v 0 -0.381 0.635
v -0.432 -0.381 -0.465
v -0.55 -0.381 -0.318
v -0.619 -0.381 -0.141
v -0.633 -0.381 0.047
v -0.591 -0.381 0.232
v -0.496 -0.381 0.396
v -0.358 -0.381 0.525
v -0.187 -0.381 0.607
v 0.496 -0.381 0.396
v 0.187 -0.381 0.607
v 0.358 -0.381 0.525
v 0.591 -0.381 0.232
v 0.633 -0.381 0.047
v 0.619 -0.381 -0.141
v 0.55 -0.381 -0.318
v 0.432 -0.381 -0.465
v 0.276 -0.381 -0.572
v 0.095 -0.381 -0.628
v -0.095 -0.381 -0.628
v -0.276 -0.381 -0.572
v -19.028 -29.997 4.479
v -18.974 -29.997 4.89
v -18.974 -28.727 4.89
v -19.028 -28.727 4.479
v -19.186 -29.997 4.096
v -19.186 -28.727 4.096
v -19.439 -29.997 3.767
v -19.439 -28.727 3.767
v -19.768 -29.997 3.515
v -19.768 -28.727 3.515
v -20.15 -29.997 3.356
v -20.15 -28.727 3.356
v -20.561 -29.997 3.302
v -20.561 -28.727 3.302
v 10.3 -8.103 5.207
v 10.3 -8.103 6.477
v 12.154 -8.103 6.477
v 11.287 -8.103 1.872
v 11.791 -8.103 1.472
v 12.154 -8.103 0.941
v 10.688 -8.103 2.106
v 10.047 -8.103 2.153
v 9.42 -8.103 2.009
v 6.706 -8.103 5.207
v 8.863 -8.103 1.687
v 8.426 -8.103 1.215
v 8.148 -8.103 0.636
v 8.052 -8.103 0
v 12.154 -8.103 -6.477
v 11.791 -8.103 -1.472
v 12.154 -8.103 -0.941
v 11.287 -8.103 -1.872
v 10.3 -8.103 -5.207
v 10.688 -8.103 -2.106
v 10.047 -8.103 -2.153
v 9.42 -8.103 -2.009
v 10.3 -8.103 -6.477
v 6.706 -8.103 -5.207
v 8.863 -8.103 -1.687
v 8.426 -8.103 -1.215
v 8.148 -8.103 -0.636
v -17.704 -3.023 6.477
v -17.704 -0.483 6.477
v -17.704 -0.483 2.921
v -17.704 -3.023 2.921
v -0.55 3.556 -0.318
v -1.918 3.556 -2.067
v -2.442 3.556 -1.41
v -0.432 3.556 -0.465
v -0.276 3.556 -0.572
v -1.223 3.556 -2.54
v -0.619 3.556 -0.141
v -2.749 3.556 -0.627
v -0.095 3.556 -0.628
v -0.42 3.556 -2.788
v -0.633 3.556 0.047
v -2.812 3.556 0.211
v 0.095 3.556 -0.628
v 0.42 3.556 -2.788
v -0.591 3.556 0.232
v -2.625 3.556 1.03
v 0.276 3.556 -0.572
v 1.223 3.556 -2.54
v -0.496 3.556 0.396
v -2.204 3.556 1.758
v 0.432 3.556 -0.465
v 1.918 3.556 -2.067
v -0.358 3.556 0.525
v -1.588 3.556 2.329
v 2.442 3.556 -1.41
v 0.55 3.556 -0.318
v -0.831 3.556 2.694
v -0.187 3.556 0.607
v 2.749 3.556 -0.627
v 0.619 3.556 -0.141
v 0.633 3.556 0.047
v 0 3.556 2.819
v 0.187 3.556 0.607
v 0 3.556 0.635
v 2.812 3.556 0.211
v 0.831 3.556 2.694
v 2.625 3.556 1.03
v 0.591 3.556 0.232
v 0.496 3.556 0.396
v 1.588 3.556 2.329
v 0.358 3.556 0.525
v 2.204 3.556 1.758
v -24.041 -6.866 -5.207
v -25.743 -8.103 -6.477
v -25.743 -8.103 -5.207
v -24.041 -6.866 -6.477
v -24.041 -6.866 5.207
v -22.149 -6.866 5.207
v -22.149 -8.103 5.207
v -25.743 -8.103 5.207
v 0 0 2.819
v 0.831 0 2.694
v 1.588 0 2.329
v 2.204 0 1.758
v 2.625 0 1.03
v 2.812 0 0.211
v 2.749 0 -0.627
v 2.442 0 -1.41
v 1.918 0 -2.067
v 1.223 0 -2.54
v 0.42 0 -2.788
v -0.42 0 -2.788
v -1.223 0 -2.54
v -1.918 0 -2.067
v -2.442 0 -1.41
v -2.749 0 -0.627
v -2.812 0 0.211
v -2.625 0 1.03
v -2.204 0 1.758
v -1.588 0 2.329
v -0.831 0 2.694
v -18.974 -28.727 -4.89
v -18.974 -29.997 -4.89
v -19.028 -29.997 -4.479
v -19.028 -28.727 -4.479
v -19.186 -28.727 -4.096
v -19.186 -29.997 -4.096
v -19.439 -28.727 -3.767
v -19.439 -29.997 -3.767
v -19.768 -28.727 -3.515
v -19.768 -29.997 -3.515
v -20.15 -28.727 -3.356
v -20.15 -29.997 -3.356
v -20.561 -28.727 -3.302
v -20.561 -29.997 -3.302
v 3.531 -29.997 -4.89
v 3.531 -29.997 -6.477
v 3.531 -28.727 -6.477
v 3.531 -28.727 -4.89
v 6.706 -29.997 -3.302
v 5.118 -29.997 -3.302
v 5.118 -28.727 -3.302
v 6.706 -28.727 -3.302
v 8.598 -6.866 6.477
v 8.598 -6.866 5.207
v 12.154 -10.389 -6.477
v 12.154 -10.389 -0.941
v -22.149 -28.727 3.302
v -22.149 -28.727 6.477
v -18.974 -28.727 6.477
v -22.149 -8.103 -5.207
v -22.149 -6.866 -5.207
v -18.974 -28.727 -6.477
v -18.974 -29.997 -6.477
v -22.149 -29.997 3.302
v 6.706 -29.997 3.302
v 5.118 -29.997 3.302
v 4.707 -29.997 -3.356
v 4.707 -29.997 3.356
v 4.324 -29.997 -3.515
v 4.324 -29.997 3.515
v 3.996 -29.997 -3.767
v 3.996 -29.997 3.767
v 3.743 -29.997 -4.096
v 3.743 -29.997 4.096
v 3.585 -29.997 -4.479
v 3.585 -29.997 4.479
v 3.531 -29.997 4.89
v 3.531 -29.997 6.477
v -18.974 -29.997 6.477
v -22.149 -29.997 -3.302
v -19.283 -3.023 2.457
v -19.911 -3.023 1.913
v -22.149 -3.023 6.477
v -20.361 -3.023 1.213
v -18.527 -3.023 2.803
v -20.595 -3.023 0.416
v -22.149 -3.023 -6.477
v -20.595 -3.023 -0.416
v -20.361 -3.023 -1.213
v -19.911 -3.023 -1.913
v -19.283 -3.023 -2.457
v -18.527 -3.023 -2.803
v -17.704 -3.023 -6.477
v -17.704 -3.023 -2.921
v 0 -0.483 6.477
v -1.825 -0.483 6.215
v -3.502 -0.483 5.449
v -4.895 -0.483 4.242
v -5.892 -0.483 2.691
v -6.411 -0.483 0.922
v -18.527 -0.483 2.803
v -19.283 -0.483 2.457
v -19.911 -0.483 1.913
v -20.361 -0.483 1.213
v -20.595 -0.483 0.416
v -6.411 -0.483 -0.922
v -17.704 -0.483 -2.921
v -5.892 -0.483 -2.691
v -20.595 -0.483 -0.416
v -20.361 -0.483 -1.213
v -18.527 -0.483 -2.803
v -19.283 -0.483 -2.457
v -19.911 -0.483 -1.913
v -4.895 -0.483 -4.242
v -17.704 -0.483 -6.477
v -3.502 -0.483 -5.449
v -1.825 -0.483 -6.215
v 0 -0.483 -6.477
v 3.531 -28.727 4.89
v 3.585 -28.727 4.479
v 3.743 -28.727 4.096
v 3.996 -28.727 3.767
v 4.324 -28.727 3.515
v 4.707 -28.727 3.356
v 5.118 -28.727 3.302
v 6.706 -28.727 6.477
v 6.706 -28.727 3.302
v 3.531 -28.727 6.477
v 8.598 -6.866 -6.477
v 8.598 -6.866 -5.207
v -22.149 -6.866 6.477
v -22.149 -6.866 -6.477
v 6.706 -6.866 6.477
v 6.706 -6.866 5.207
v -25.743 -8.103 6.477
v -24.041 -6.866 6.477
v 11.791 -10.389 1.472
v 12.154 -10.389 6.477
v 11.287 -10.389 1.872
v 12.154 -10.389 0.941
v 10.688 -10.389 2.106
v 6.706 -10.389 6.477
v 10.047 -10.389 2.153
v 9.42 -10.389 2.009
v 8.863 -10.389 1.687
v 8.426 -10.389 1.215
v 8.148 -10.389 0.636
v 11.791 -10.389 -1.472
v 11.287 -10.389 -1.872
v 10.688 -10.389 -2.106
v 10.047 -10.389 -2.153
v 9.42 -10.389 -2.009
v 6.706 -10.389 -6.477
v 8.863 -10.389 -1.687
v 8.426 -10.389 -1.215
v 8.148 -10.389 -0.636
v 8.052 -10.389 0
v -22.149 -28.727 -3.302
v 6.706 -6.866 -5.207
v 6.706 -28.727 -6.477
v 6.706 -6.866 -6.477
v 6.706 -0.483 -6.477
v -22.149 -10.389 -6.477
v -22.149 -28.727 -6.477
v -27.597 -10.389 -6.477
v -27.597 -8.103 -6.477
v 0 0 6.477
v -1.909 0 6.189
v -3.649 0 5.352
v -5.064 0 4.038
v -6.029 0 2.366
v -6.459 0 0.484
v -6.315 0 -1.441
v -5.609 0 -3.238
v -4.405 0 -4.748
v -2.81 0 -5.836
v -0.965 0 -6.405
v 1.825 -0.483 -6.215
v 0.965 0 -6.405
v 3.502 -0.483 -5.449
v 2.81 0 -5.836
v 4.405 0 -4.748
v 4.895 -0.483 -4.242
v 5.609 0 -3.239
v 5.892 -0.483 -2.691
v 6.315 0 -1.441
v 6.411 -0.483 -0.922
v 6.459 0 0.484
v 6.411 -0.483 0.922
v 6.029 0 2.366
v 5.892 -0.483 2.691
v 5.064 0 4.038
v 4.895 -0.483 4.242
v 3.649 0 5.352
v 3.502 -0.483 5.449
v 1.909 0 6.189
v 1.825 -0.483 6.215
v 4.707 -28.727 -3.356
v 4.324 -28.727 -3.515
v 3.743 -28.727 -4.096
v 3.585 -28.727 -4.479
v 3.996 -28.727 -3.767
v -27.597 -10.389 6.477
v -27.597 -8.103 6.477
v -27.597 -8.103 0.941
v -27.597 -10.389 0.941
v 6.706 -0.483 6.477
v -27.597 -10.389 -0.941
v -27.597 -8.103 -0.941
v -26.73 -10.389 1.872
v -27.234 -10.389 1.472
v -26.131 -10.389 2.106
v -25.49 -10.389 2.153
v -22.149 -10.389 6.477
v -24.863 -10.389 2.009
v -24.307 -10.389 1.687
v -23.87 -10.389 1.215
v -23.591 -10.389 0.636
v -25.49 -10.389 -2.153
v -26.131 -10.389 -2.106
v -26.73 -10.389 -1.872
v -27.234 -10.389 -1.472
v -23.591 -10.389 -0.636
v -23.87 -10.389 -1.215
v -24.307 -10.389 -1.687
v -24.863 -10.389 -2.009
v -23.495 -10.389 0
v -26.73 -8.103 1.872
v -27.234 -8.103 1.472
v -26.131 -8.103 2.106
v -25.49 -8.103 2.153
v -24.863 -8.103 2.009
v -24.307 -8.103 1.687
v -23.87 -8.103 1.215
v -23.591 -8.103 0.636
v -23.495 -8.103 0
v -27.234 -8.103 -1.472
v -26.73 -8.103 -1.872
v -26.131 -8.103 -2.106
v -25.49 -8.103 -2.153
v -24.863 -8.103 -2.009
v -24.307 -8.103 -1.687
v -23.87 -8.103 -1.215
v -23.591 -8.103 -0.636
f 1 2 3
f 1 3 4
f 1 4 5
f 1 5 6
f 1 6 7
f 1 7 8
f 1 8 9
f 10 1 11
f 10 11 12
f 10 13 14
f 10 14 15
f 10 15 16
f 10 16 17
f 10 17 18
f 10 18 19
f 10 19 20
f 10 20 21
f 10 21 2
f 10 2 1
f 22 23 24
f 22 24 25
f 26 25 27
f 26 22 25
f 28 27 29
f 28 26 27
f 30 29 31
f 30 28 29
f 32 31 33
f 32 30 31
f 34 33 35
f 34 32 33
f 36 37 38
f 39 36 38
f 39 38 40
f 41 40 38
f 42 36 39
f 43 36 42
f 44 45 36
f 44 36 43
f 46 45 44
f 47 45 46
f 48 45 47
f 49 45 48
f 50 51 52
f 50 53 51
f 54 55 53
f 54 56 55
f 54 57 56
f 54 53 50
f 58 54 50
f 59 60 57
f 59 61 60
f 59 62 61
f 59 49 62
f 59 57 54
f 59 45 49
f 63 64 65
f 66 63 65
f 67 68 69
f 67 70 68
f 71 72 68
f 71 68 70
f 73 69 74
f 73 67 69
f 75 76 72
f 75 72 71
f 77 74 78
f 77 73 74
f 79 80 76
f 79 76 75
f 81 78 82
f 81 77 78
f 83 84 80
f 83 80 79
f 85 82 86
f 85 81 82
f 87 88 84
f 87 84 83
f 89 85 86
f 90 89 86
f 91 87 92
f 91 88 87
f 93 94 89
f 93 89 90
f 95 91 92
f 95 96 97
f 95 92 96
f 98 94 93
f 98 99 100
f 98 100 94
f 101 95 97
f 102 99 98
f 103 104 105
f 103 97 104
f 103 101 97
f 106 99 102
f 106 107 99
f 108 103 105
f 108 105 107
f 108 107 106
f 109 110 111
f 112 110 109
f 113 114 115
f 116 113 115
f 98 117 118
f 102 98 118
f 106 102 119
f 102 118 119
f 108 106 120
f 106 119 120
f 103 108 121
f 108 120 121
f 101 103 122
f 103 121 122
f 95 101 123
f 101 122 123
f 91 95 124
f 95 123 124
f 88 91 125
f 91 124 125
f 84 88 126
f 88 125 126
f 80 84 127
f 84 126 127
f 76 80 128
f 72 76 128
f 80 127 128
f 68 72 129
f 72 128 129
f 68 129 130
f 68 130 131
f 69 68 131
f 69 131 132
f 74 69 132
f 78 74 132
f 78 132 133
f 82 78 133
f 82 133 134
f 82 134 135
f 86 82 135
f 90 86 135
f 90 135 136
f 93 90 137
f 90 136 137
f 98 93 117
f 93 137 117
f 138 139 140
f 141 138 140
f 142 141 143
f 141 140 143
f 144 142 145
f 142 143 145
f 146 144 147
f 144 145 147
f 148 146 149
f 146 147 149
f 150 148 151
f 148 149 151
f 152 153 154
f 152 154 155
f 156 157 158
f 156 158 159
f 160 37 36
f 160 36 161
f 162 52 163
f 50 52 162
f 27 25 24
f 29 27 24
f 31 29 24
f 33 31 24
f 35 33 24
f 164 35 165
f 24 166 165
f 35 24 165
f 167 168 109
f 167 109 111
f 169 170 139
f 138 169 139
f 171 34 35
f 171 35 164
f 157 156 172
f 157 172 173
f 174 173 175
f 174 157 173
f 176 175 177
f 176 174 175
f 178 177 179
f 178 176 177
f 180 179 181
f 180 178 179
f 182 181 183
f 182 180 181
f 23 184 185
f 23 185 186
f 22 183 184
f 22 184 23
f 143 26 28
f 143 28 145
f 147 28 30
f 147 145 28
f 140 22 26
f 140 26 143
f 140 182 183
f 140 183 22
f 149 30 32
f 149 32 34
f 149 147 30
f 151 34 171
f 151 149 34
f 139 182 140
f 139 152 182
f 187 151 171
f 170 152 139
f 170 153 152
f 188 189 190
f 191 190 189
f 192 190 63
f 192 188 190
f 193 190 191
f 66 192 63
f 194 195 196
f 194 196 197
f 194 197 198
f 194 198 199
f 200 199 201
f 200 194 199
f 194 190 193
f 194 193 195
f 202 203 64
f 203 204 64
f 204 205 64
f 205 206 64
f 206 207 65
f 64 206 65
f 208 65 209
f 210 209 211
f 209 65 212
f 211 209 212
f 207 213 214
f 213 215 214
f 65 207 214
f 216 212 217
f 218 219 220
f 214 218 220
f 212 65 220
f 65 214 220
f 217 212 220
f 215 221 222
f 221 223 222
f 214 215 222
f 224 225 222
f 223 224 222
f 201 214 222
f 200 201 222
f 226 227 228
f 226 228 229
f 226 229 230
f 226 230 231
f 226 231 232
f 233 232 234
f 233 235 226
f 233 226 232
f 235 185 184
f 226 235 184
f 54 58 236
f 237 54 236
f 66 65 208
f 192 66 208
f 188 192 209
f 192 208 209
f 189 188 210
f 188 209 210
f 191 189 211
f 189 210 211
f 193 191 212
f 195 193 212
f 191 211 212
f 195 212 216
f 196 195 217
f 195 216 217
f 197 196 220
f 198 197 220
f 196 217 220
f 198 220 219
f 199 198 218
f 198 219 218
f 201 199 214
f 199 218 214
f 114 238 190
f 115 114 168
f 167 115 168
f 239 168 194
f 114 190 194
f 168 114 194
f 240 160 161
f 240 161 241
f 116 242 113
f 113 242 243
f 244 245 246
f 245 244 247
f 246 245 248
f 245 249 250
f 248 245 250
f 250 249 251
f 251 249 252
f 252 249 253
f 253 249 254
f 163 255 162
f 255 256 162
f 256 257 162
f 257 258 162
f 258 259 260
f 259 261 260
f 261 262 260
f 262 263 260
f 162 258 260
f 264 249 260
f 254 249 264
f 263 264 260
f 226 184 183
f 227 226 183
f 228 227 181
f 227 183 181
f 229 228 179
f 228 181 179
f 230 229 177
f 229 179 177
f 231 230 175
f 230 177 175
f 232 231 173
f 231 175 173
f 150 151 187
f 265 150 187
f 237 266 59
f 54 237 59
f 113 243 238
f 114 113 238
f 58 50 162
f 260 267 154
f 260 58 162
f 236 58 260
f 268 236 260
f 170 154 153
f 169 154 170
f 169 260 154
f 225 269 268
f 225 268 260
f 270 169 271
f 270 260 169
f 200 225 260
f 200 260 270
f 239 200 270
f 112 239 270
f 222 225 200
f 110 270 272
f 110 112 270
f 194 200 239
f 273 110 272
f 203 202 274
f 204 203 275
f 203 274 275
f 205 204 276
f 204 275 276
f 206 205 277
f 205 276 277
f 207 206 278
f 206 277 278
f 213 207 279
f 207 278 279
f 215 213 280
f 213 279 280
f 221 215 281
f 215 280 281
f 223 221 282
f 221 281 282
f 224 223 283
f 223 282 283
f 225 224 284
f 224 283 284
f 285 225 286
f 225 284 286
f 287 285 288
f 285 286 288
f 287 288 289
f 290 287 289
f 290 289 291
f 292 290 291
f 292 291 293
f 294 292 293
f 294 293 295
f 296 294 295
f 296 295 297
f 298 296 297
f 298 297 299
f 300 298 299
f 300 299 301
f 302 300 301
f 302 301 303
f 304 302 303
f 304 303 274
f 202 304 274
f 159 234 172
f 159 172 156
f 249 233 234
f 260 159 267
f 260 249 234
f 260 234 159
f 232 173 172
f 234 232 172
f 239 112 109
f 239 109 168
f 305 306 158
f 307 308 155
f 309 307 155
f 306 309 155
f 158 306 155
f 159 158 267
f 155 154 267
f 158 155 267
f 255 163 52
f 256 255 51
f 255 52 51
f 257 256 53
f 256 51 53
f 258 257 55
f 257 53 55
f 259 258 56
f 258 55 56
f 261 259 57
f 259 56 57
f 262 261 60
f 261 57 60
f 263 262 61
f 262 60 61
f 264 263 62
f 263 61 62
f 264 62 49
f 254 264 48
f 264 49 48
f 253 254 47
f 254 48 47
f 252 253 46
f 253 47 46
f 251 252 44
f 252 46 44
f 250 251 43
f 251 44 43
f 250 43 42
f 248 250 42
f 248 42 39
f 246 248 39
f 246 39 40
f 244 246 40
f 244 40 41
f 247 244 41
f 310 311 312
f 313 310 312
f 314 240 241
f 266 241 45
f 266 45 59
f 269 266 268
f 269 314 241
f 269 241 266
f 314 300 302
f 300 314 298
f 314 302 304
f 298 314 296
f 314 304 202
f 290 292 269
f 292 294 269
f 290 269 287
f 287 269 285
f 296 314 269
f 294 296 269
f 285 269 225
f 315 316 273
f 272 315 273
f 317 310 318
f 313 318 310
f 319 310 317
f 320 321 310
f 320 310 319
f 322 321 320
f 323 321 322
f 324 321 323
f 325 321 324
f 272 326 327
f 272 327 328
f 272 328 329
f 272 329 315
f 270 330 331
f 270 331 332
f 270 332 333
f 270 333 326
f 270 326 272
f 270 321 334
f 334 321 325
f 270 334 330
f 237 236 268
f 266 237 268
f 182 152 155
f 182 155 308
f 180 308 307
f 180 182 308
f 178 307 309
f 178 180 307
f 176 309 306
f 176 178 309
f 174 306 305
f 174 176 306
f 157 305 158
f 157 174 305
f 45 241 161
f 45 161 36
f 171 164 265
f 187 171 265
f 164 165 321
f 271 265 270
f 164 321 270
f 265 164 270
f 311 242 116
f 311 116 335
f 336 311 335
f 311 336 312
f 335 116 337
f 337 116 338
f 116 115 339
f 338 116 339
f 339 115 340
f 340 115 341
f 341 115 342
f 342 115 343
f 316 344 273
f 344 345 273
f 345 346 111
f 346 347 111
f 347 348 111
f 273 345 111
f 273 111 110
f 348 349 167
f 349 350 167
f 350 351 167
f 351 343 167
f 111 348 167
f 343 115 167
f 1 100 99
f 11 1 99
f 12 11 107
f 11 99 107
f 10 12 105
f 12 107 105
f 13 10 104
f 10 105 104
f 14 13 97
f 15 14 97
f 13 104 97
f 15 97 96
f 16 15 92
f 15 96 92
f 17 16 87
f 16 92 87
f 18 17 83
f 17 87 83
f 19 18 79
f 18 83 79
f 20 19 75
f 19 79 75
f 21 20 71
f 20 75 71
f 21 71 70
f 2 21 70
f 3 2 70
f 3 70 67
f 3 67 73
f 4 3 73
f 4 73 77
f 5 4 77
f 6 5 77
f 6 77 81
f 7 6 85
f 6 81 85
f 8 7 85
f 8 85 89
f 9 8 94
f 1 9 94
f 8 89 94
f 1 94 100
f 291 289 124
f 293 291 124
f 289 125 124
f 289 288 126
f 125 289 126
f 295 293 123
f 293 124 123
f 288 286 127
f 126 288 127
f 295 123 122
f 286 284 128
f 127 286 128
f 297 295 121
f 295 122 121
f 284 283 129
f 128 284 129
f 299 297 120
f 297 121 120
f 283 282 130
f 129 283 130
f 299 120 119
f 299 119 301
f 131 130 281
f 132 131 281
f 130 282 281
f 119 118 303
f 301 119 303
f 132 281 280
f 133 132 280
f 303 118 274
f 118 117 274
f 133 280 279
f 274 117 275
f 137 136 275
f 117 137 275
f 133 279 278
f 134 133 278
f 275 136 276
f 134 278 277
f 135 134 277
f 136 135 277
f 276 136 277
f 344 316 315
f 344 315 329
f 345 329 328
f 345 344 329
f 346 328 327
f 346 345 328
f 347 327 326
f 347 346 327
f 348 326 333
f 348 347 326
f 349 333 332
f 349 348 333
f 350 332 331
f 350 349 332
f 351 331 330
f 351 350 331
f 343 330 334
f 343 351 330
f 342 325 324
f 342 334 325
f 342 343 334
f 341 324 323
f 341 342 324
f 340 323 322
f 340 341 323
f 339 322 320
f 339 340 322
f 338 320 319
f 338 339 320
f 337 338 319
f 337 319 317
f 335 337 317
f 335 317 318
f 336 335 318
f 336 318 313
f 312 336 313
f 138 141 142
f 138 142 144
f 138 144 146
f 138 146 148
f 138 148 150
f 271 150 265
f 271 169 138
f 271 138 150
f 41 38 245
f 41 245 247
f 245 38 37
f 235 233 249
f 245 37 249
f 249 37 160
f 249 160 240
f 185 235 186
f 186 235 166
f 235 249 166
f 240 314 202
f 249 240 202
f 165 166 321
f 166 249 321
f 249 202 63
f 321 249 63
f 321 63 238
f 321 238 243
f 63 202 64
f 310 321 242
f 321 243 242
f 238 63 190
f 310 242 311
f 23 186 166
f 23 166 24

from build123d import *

# Parameters (mm, degrees)
SKETCH1_R               = 2.8194
BOSS_EXTRUDE1_DEPTH     = 3.556
SKETCH2_R               = 6.477
BOSS_EXTRUDE2_DEPTH     = 0.4826
SKETCH3_W               = 28.8544
SKETCH3_H               = 12.954
BOSS_EXTRUDE3_DEPTH     = 29.5148
SKETCH4_R               = 0.635
CUT_EXTRUDE1_DEPTH      = 3.937
SKETCH5_W               = 12.954
SKETCH5_H               = 2.286
BOSS_EXTRUDE4_DEPTH     = 5.4483
BOSS_EXTRUDE5_DEPTH     = 1.27
SKETCH7_R               = 2.159
CUT_EXTRUDE2_DEPTH      = 32.810424981
MIRROR3_COPY_1_DEPTH    = 1.27
CUT_EXTRUDE3_DEPTH      = 2.54
SKETCH10_R              = 1.5875
CUT_EXTRUDE4_DEPTH      = 1.27
MIRROR5_COPY_1_SKETCH_R = 1.5875
MIRROR5_COPY_1_DEPTH    = 1.27


with BuildPart() as part:
    # Sketch1 → Boss-Extrude1 (new body)
    with BuildSketch(Plane(origin=(0, 0, 0), x_dir=(1, 0, 0), z_dir=(0, 1, 0))):
        with Locations(Location((0, 0, 0), (0, 0, 270))):
            Circle(SKETCH1_R)
    extrude(amount=BOSS_EXTRUDE1_DEPTH)

    # Sketch2 → Boss-Extrude2 (add)
    with BuildSketch(Plane(origin=(0, 0, 0), x_dir=(-1, 0, 0), z_dir=(0, -1, 0))):
        with Locations(Location((0, 0, 0), (0, 0, 270))):
            Circle(SKETCH2_R)
    extrude(amount=BOSS_EXTRUDE2_DEPTH)

    # Sketch3 → Boss-Extrude3 (add)
    with BuildSketch(Plane(origin=(0, -0.4826, 0), x_dir=(-1, 0, 0), z_dir=(0, -1, 0))):
        with Locations((7.7216, 0)):
            Rectangle(SKETCH3_W, SKETCH3_H)
    extrude(amount=BOSS_EXTRUDE3_DEPTH)

    # Sketch4 → Cut-Extrude1 (cut)
    with BuildSketch(Plane(origin=(0, 3.556, 0), x_dir=(1, 0, 0), z_dir=(0, 1, 0))):
        with Locations(Location((0, 0, 0), (0, 0, 270))):
            Circle(SKETCH4_R)
    extrude(amount=-CUT_EXTRUDE1_DEPTH, mode=Mode.SUBTRACT)

    # Sketch5 → Boss-Extrude4 (add)
    with BuildSketch(Plane(origin=(6.7056, 0, 0), x_dir=(0, 0, -1), z_dir=(1, 0, 0))):
        with Locations((0, -9.2456)):
            Rectangle(SKETCH5_W, SKETCH5_H)
    boss_extrude4 = extrude(amount=BOSS_EXTRUDE4_DEPTH)

    # Sketch6 → Boss-Extrude5 (add)
    with BuildSketch(Plane.XY.offset(6.477)):
        Polygon((6.7056, -8.1026), (10.2997, -8.1026), (8.5979, -6.866466582), (6.7056, -6.866466582), align=None)
    boss_extrude5 = extrude(amount=-BOSS_EXTRUDE5_DEPTH)

    # Mirror1: Boss-Extrude5 across plane
    add(boss_extrude5.mirror(Plane.XY))

    # Sketch7 → Cut-Extrude2 (cut, through all)
    with BuildSketch(Plane(origin=(0, -8.1026, 0), x_dir=(1, 0, 0), z_dir=(0, 1, 0))):
        with Locations((10.2108, 0)):
            Circle(SKETCH7_R)
    cut_extrude2 = extrude(amount=-CUT_EXTRUDE2_DEPTH, mode=Mode.SUBTRACT)

    # Mirror3: Boss-Extrude4, Boss-Extrude5, Cut-Extrude2 across plane
    add(boss_extrude4.mirror(Plane(origin=(-7.7216, 0, 0), x_dir=(0, 0, 1), z_dir=(1, 0, 0))))
    add(boss_extrude5.mirror(Plane(origin=(-7.7216, 0, 0), x_dir=(0, 0, 1), z_dir=(1, 0, 0))))
    add(cut_extrude2.mirror(Plane(origin=(-7.7216, 0, 0), x_dir=(0, 0, 1), z_dir=(1, 0, 0))), mode=Mode.SUBTRACT)

    # Mirror3 copy 1 sketch → Mirror3 copy 1 (add)
    with BuildSketch(Plane(origin=(-15.4432, 0, -6.477), x_dir=(-1, 0, 0), z_dir=(0, 0, -1))):
        Polygon((6.7056, -8.1026), (10.2997, -8.1026), (8.5979, -6.866466582), (6.7056, -6.866466582), align=None)
    extrude(amount=-MIRROR3_COPY_1_DEPTH)

    # Sketch9 → Cut-Extrude3 (cut)
    with BuildSketch(Plane(origin=(0, -0.4826, 0), x_dir=(1, 0, 0), z_dir=(0, 1, 0))):
        with BuildLine():
            Line((-22.1488, 6.477), (-22.1488, -6.477))
            Line((-22.1488, -6.477), (-17.7038, -6.477))
            Line((-17.7038, -6.477), (-17.7038, -2.921))
            ThreePointArc((-17.7038, -2.921), (-20.6248, 0), (-17.7038, 2.921))
            Line((-17.7038, 2.921), (-17.7038, 6.477))
            Line((-17.7038, 6.477), (-22.1488, 6.477))
        make_face()
    extrude(amount=-CUT_EXTRUDE3_DEPTH, mode=Mode.SUBTRACT)

    # Sketch10 → Cut-Extrude4 (cut)
    with BuildSketch(Plane(origin=(0, -29.9974, 0), x_dir=(-1, 0, 0), z_dir=(0, -1, 0))):
        with Locations((20.5613, 4.8895)):
            Circle(SKETCH10_R)
        with BuildLine():
            Line((22.1488, 6.477), (20.5613, 6.477))
            ThreePointArc((20.5613, 6.477), (21.683832015, 6.012032015), (22.1488, 4.8895))
            Line((22.1488, 4.8895), (22.1488, 6.477))
        make_face()
        with BuildLine():
            ThreePointArc((18.9738, 4.8895), (19.438767985, 6.012032015), (20.5613, 6.477))
            Line((20.5613, 6.477), (18.9738, 6.477))
            Line((18.9738, 6.477), (18.9738, 4.8895))
        make_face()
        with BuildLine():
            Line((22.1488, 3.302), (22.1488, 4.8895))
            ThreePointArc((22.1488, 4.8895), (21.683832015, 3.766967985), (20.5613, 3.302))
            Line((20.5613, 3.302), (22.1488, 3.302))
        make_face()
    cut_extrude4 = extrude(amount=-CUT_EXTRUDE4_DEPTH, mode=Mode.SUBTRACT)

    # Mirror4: Cut-Extrude4 across plane
    add(cut_extrude4.mirror(Plane.XY), mode=Mode.SUBTRACT)

    # Mirror5: Cut-Extrude4 across plane
    add(cut_extrude4.mirror(Plane(origin=(-7.7216, 0, 0), x_dir=(0, 0, 1), z_dir=(1, 0, 0))), mode=Mode.SUBTRACT)

    # Mirror5 copy 1 sketch → Mirror5 copy 1 (cut)
    with BuildSketch(Plane(origin=(-15.4432, -29.9974, 0), x_dir=(1, 0, 0), z_dir=(0, -1, 0))):
        with Locations((20.5613, 4.8895)):
            Circle(MIRROR5_COPY_1_SKETCH_R)
        with BuildLine():
            Line((22.1488, 6.477), (20.5613, 6.477))
            ThreePointArc((20.5613, 6.477), (21.683832015, 6.012032015), (22.1488, 4.8895))
            Line((22.1488, 4.8895), (22.1488, 6.477))
        make_face()
        with BuildLine():
            ThreePointArc((18.9738, 4.8895), (19.438767985, 6.012032015), (20.5613, 6.477))
            Line((20.5613, 6.477), (18.9738, 6.477))
            Line((18.9738, 6.477), (18.9738, 4.8895))
        make_face()
        with BuildLine():
            Line((22.1488, 3.302), (22.1488, 4.8895))
            ThreePointArc((22.1488, 4.8895), (21.683832015, 3.766967985), (20.5613, 3.302))
            Line((20.5613, 3.302), (22.1488, 3.302))
        make_face()
    extrude(amount=-MIRROR5_COPY_1_DEPTH, mode=Mode.SUBTRACT)


solid = part.part
